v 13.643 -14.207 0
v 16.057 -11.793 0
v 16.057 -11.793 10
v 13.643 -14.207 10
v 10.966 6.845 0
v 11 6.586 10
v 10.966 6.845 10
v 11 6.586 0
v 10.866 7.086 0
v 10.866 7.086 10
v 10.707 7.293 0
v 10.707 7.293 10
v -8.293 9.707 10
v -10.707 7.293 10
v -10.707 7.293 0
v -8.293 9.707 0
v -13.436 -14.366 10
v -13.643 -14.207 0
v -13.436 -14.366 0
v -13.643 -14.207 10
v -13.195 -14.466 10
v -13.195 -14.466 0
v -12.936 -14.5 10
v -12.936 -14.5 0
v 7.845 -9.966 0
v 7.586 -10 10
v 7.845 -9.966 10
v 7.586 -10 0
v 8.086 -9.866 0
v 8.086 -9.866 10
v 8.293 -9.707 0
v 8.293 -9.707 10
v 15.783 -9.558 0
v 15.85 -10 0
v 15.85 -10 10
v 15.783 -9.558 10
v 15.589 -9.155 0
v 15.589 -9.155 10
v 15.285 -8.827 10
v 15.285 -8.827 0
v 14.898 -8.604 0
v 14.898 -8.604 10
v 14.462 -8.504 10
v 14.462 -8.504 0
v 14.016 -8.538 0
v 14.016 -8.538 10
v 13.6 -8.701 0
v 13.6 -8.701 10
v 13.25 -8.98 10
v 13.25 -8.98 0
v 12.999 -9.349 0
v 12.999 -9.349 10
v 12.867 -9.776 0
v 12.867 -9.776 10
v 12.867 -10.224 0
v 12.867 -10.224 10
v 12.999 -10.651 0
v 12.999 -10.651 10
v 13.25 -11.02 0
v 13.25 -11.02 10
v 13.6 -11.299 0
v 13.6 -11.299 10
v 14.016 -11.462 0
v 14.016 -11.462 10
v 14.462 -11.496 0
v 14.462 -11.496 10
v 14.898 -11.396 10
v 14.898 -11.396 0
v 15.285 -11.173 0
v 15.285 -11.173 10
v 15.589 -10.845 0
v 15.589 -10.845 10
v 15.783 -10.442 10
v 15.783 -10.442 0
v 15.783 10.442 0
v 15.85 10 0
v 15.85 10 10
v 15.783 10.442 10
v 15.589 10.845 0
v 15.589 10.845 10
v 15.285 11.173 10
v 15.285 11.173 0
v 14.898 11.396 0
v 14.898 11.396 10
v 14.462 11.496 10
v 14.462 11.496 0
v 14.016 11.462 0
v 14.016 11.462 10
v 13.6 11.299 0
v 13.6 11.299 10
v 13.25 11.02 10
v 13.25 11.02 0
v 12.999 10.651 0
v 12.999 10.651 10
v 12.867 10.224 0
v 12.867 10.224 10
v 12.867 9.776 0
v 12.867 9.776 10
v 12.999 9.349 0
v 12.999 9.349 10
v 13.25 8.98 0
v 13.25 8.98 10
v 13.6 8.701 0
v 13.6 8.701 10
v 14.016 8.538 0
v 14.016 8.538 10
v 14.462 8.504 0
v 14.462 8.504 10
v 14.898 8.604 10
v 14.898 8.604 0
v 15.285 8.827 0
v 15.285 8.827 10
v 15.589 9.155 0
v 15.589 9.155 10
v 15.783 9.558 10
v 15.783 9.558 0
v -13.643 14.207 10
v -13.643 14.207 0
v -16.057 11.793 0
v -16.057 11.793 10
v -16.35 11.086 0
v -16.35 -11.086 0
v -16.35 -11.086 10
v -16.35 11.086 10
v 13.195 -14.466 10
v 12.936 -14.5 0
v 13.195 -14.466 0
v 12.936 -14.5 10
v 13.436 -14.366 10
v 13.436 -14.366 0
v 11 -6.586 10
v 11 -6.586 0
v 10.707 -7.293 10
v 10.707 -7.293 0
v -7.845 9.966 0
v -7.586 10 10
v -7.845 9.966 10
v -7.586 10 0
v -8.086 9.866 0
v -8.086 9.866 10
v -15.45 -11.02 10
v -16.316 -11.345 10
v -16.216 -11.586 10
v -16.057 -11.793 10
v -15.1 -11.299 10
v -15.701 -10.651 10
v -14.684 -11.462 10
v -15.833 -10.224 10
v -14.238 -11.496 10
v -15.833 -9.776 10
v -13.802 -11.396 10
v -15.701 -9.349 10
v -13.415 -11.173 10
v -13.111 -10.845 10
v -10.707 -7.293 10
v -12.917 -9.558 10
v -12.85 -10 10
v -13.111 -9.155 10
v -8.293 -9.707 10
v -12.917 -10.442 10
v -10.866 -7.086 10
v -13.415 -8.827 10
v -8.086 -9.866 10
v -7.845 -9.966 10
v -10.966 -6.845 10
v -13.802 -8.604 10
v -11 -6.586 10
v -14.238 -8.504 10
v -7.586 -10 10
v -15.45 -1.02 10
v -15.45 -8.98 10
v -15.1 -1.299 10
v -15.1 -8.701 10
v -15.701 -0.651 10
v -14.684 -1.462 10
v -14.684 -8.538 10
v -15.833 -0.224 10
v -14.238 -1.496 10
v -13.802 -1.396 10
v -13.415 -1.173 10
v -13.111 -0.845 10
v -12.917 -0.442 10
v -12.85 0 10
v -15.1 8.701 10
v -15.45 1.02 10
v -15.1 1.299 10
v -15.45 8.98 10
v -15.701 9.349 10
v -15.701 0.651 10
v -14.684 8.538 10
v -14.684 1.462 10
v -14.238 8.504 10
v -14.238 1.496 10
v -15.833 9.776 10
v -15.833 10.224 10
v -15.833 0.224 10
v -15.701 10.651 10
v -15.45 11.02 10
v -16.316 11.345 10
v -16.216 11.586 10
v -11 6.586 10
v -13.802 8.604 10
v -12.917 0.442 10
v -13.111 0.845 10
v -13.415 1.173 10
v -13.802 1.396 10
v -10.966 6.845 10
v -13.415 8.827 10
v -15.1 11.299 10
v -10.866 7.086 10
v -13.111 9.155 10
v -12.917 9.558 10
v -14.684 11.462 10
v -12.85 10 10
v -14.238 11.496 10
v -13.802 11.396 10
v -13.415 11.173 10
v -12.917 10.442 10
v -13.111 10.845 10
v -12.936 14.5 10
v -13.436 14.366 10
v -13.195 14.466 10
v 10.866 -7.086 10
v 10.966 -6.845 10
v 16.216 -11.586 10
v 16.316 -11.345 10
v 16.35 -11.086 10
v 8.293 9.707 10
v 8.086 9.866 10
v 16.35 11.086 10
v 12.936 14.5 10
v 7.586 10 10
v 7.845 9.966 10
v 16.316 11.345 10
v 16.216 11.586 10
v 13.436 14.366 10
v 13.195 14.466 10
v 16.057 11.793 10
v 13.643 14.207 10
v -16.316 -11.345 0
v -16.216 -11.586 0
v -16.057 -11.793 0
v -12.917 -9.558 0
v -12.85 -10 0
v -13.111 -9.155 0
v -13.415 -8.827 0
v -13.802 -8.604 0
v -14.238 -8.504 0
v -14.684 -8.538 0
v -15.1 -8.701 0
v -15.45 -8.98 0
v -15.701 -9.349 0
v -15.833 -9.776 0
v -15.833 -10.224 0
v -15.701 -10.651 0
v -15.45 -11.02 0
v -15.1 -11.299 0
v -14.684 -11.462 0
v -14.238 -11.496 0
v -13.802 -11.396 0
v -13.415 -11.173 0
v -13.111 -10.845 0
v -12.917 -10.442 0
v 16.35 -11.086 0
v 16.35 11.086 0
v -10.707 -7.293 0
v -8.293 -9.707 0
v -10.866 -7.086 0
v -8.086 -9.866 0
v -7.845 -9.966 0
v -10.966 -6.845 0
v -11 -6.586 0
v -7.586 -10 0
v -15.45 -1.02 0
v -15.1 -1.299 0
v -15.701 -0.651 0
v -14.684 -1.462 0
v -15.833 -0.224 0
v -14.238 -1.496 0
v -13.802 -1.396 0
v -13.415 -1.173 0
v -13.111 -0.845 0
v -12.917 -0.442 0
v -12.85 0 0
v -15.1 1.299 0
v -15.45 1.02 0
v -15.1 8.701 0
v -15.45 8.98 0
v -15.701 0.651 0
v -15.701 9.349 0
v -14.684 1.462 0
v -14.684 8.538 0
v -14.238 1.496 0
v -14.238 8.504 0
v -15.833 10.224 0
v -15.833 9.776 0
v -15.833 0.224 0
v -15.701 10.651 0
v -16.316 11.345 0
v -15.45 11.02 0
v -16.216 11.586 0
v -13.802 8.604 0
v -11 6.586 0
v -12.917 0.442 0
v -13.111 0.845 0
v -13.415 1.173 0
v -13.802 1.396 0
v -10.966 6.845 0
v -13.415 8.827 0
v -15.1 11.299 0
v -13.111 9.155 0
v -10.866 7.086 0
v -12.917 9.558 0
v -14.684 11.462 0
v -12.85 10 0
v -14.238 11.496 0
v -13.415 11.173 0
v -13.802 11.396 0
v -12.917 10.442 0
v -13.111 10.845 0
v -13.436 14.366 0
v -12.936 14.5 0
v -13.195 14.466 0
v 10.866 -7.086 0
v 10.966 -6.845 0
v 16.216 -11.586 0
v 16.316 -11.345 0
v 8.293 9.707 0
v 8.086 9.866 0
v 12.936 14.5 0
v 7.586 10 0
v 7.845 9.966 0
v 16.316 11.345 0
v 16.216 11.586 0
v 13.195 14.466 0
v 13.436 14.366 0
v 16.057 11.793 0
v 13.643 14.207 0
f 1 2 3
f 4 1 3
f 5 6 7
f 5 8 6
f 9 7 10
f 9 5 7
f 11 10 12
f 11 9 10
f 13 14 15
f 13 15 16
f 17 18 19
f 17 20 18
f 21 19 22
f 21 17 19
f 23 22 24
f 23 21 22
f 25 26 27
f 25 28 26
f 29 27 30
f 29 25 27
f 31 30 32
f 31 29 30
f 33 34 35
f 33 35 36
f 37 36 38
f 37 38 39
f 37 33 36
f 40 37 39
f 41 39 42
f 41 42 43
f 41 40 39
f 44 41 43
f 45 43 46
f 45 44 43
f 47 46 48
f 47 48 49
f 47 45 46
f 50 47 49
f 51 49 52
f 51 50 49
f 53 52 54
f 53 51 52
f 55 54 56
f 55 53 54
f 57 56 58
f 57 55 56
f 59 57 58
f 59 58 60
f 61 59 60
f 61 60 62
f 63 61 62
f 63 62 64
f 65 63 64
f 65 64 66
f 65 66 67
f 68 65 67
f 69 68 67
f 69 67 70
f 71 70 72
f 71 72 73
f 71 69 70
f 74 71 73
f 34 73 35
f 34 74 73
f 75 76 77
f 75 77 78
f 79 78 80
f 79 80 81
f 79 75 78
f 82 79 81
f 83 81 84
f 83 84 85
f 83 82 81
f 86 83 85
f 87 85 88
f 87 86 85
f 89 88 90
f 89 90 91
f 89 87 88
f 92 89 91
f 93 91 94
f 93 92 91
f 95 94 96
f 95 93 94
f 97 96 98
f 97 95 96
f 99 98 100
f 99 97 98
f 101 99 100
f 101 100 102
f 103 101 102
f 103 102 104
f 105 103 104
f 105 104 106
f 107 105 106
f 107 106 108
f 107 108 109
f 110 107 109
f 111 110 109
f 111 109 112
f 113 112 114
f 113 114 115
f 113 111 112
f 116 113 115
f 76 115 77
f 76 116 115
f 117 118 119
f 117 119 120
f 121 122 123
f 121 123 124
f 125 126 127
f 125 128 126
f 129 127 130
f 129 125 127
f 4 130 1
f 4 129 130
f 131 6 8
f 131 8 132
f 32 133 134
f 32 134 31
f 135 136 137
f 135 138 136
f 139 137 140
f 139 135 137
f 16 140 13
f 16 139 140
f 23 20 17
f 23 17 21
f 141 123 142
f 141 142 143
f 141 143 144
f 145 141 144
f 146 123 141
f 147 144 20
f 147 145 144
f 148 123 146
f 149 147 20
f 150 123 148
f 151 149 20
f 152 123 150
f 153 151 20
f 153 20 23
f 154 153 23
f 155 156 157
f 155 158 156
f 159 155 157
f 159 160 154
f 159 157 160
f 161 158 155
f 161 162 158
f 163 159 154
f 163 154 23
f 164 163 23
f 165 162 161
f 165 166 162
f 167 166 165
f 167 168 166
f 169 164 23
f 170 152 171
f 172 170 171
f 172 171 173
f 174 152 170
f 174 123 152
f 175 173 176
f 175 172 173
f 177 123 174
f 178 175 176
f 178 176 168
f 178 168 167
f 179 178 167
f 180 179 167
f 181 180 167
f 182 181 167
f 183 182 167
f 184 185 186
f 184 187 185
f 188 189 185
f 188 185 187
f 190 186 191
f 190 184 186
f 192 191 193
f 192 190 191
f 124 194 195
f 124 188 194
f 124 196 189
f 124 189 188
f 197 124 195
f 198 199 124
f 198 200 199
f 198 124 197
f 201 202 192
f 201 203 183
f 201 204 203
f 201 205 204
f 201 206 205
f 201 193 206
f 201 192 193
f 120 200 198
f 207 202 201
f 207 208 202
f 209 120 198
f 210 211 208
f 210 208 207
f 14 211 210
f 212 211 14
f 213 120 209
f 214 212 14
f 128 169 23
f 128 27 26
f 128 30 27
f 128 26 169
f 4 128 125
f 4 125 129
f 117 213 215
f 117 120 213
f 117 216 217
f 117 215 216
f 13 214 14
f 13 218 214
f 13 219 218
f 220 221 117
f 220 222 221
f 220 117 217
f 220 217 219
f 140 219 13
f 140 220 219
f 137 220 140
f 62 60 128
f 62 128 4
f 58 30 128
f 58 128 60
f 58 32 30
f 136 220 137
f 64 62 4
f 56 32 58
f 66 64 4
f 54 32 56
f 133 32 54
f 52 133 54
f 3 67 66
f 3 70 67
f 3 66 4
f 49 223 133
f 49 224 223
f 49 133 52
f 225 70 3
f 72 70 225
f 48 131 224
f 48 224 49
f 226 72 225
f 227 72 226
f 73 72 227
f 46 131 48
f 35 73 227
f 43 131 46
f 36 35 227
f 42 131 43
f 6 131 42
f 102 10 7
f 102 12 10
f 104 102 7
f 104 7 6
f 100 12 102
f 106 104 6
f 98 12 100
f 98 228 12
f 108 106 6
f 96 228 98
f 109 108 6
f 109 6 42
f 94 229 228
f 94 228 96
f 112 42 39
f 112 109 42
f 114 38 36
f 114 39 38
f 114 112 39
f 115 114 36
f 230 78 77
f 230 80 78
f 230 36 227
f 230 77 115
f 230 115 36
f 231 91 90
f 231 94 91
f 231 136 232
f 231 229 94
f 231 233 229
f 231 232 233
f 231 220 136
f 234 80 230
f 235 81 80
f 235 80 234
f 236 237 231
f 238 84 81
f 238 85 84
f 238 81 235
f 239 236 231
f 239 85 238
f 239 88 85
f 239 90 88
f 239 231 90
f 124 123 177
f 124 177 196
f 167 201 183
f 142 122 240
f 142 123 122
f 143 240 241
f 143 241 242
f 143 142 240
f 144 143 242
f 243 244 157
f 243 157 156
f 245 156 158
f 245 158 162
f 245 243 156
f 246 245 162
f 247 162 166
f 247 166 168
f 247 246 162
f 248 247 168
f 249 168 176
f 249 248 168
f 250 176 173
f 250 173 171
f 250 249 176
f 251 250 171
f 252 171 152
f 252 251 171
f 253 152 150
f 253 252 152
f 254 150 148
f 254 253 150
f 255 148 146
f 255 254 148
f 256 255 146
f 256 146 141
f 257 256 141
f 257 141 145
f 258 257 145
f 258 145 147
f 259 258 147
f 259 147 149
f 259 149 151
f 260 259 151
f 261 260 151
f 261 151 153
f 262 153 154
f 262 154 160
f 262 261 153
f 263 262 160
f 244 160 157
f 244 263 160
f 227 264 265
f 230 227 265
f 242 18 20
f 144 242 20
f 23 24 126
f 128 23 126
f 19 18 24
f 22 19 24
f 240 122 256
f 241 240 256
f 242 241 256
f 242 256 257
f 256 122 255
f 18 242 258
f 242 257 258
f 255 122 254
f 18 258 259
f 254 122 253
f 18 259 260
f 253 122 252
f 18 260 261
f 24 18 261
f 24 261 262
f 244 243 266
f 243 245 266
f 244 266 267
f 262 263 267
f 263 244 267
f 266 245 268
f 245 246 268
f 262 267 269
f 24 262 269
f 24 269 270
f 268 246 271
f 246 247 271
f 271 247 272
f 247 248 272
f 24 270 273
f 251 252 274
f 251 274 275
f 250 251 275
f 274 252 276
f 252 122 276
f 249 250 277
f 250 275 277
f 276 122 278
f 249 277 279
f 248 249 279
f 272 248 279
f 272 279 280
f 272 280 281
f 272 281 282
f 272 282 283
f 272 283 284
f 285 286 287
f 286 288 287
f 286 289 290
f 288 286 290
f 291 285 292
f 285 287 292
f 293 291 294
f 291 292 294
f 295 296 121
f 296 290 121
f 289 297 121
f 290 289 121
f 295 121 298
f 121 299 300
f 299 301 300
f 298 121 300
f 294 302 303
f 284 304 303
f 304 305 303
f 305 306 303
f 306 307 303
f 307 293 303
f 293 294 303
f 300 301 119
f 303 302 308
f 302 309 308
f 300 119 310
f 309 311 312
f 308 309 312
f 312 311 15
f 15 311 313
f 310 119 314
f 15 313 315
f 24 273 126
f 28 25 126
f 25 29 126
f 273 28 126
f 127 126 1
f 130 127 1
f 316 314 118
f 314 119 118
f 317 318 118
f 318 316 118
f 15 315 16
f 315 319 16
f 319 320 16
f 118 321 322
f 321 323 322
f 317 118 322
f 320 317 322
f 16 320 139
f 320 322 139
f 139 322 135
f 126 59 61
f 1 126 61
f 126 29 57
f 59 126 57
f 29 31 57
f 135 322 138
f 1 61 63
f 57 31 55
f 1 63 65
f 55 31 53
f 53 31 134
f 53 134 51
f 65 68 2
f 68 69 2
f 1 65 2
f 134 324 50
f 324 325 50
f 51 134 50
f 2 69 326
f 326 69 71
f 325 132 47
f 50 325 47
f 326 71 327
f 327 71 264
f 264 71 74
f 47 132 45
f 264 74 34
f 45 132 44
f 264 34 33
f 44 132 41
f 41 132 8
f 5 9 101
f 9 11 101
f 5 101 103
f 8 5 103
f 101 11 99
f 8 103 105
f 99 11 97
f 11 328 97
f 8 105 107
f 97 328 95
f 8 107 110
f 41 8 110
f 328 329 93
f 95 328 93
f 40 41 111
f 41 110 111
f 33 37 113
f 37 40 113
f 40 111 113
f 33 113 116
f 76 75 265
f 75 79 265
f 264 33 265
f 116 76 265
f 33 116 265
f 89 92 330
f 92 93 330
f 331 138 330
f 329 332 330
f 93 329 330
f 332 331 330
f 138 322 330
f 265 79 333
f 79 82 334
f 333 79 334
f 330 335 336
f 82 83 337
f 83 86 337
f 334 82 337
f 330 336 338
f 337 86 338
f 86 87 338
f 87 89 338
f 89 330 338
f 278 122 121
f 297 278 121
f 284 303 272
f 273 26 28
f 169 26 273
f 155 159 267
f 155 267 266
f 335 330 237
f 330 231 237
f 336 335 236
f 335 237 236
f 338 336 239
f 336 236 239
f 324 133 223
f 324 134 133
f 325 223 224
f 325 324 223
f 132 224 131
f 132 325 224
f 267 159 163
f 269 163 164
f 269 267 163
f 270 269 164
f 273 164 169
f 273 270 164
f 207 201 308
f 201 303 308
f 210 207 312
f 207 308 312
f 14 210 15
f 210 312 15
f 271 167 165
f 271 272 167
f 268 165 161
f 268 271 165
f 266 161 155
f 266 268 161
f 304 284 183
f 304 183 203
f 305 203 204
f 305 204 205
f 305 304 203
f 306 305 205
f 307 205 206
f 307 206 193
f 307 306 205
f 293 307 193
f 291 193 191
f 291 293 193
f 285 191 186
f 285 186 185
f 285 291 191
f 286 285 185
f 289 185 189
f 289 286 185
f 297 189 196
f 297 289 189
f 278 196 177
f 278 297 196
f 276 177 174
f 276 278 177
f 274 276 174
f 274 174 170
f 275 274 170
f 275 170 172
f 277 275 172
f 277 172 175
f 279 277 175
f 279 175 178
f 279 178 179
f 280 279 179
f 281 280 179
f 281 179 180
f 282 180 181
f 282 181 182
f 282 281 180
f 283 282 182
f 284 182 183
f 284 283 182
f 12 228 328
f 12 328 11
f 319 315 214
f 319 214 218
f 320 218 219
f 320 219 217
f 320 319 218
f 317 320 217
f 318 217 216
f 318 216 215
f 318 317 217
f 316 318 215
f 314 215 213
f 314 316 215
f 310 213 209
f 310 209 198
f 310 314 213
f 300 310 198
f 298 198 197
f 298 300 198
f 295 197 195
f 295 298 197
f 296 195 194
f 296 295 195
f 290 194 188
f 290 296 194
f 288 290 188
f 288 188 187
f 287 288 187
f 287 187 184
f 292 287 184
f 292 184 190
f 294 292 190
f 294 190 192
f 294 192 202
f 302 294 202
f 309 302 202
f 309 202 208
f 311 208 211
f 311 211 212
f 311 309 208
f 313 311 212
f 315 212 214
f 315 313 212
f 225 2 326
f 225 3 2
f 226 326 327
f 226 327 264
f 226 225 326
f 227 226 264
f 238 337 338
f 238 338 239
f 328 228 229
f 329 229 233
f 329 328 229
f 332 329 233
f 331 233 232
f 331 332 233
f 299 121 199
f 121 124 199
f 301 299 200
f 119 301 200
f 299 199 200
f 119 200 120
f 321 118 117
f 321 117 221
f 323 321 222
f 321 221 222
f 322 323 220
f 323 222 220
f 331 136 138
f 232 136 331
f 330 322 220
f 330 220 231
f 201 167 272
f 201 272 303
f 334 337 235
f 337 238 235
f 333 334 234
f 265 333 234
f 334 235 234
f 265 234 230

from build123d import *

# Parameters (mm, degrees)
SKETCH_1_W          = 32.7
SKETCH_1_H          = 29
SKETCH_1_R          = 1.5
EXTRUDE_1_DEPTH     = 10
CHAMFER_1_SIZE      = 3
CUT_EXTRUDE_1_DEPTH = 11
FILLET_1_R          = 1


with BuildPart() as part:
    # 草图1 → 凸台-拉伸1 (new body)
    with BuildSketch(Plane.XY):
        Rectangle(SKETCH_1_W, SKETCH_1_H)
        with Locations((-14.35, -10)):
            Circle(SKETCH_1_R, mode=Mode.SUBTRACT)
        with Locations((-14.35, 10)):
            Circle(SKETCH_1_R, mode=Mode.SUBTRACT)
        with Locations((14.35, 10)):
            Circle(SKETCH_1_R, mode=Mode.SUBTRACT)
        with Locations((14.35, -10)):
            Circle(SKETCH_1_R, mode=Mode.SUBTRACT)
        with Locations((-14.35, 0)):
            Circle(SKETCH_1_R, mode=Mode.SUBTRACT)
    extrude(amount=EXTRUDE_1_DEPTH)

    # 倒角1
    chamfer_1_edges = [part.edges().sort_by_distance(p)[0] for p in [
        (16.35, -14.5, 5),
        (-16.35, -14.5, 5),
        (-16.35, 14.5, 5),
        (16.35, 14.5, 5),
    ]]
    chamfer(chamfer_1_edges, length=CHAMFER_1_SIZE)

    # 草图2 → 切除-拉伸1 (cut, through all)
    with BuildSketch(Plane.XY.offset(10)):
        Polygon((-11, 7), (-8, 10), (8, 10), (11, 7), (11, -7), (8, -10), (-8, -10), (-11, -7), align=None)
    extrude(amount=-CUT_EXTRUDE_1_DEPTH, mode=Mode.SUBTRACT)

    # 圆角1
    fillet_1_edges = [part.edges().sort_by_distance(p)[0] for p in [
        (16.35, 11.5, 5),
        (16.35, -11.5, 5),
        (-13.35, -14.5, 5),
        (13.35, -14.5, 5),
        (-13.35, 14.5, 5),
        (13.35, 14.5, 5),
        (-16.35, 11.5, 5),
        (-16.35, -11.5, 5),
        (-8, 10, 5),
        (8, 10, 5),
        (11, 7, 5),
        (11, -7, 5),
        (8, -10, 5),
        (-8, -10, 5),
        (-11, -7, 5),
        (-11, 7, 5),
    ]]
    fillet(fillet_1_edges, radius=FILLET_1_R)


solid = part.part
